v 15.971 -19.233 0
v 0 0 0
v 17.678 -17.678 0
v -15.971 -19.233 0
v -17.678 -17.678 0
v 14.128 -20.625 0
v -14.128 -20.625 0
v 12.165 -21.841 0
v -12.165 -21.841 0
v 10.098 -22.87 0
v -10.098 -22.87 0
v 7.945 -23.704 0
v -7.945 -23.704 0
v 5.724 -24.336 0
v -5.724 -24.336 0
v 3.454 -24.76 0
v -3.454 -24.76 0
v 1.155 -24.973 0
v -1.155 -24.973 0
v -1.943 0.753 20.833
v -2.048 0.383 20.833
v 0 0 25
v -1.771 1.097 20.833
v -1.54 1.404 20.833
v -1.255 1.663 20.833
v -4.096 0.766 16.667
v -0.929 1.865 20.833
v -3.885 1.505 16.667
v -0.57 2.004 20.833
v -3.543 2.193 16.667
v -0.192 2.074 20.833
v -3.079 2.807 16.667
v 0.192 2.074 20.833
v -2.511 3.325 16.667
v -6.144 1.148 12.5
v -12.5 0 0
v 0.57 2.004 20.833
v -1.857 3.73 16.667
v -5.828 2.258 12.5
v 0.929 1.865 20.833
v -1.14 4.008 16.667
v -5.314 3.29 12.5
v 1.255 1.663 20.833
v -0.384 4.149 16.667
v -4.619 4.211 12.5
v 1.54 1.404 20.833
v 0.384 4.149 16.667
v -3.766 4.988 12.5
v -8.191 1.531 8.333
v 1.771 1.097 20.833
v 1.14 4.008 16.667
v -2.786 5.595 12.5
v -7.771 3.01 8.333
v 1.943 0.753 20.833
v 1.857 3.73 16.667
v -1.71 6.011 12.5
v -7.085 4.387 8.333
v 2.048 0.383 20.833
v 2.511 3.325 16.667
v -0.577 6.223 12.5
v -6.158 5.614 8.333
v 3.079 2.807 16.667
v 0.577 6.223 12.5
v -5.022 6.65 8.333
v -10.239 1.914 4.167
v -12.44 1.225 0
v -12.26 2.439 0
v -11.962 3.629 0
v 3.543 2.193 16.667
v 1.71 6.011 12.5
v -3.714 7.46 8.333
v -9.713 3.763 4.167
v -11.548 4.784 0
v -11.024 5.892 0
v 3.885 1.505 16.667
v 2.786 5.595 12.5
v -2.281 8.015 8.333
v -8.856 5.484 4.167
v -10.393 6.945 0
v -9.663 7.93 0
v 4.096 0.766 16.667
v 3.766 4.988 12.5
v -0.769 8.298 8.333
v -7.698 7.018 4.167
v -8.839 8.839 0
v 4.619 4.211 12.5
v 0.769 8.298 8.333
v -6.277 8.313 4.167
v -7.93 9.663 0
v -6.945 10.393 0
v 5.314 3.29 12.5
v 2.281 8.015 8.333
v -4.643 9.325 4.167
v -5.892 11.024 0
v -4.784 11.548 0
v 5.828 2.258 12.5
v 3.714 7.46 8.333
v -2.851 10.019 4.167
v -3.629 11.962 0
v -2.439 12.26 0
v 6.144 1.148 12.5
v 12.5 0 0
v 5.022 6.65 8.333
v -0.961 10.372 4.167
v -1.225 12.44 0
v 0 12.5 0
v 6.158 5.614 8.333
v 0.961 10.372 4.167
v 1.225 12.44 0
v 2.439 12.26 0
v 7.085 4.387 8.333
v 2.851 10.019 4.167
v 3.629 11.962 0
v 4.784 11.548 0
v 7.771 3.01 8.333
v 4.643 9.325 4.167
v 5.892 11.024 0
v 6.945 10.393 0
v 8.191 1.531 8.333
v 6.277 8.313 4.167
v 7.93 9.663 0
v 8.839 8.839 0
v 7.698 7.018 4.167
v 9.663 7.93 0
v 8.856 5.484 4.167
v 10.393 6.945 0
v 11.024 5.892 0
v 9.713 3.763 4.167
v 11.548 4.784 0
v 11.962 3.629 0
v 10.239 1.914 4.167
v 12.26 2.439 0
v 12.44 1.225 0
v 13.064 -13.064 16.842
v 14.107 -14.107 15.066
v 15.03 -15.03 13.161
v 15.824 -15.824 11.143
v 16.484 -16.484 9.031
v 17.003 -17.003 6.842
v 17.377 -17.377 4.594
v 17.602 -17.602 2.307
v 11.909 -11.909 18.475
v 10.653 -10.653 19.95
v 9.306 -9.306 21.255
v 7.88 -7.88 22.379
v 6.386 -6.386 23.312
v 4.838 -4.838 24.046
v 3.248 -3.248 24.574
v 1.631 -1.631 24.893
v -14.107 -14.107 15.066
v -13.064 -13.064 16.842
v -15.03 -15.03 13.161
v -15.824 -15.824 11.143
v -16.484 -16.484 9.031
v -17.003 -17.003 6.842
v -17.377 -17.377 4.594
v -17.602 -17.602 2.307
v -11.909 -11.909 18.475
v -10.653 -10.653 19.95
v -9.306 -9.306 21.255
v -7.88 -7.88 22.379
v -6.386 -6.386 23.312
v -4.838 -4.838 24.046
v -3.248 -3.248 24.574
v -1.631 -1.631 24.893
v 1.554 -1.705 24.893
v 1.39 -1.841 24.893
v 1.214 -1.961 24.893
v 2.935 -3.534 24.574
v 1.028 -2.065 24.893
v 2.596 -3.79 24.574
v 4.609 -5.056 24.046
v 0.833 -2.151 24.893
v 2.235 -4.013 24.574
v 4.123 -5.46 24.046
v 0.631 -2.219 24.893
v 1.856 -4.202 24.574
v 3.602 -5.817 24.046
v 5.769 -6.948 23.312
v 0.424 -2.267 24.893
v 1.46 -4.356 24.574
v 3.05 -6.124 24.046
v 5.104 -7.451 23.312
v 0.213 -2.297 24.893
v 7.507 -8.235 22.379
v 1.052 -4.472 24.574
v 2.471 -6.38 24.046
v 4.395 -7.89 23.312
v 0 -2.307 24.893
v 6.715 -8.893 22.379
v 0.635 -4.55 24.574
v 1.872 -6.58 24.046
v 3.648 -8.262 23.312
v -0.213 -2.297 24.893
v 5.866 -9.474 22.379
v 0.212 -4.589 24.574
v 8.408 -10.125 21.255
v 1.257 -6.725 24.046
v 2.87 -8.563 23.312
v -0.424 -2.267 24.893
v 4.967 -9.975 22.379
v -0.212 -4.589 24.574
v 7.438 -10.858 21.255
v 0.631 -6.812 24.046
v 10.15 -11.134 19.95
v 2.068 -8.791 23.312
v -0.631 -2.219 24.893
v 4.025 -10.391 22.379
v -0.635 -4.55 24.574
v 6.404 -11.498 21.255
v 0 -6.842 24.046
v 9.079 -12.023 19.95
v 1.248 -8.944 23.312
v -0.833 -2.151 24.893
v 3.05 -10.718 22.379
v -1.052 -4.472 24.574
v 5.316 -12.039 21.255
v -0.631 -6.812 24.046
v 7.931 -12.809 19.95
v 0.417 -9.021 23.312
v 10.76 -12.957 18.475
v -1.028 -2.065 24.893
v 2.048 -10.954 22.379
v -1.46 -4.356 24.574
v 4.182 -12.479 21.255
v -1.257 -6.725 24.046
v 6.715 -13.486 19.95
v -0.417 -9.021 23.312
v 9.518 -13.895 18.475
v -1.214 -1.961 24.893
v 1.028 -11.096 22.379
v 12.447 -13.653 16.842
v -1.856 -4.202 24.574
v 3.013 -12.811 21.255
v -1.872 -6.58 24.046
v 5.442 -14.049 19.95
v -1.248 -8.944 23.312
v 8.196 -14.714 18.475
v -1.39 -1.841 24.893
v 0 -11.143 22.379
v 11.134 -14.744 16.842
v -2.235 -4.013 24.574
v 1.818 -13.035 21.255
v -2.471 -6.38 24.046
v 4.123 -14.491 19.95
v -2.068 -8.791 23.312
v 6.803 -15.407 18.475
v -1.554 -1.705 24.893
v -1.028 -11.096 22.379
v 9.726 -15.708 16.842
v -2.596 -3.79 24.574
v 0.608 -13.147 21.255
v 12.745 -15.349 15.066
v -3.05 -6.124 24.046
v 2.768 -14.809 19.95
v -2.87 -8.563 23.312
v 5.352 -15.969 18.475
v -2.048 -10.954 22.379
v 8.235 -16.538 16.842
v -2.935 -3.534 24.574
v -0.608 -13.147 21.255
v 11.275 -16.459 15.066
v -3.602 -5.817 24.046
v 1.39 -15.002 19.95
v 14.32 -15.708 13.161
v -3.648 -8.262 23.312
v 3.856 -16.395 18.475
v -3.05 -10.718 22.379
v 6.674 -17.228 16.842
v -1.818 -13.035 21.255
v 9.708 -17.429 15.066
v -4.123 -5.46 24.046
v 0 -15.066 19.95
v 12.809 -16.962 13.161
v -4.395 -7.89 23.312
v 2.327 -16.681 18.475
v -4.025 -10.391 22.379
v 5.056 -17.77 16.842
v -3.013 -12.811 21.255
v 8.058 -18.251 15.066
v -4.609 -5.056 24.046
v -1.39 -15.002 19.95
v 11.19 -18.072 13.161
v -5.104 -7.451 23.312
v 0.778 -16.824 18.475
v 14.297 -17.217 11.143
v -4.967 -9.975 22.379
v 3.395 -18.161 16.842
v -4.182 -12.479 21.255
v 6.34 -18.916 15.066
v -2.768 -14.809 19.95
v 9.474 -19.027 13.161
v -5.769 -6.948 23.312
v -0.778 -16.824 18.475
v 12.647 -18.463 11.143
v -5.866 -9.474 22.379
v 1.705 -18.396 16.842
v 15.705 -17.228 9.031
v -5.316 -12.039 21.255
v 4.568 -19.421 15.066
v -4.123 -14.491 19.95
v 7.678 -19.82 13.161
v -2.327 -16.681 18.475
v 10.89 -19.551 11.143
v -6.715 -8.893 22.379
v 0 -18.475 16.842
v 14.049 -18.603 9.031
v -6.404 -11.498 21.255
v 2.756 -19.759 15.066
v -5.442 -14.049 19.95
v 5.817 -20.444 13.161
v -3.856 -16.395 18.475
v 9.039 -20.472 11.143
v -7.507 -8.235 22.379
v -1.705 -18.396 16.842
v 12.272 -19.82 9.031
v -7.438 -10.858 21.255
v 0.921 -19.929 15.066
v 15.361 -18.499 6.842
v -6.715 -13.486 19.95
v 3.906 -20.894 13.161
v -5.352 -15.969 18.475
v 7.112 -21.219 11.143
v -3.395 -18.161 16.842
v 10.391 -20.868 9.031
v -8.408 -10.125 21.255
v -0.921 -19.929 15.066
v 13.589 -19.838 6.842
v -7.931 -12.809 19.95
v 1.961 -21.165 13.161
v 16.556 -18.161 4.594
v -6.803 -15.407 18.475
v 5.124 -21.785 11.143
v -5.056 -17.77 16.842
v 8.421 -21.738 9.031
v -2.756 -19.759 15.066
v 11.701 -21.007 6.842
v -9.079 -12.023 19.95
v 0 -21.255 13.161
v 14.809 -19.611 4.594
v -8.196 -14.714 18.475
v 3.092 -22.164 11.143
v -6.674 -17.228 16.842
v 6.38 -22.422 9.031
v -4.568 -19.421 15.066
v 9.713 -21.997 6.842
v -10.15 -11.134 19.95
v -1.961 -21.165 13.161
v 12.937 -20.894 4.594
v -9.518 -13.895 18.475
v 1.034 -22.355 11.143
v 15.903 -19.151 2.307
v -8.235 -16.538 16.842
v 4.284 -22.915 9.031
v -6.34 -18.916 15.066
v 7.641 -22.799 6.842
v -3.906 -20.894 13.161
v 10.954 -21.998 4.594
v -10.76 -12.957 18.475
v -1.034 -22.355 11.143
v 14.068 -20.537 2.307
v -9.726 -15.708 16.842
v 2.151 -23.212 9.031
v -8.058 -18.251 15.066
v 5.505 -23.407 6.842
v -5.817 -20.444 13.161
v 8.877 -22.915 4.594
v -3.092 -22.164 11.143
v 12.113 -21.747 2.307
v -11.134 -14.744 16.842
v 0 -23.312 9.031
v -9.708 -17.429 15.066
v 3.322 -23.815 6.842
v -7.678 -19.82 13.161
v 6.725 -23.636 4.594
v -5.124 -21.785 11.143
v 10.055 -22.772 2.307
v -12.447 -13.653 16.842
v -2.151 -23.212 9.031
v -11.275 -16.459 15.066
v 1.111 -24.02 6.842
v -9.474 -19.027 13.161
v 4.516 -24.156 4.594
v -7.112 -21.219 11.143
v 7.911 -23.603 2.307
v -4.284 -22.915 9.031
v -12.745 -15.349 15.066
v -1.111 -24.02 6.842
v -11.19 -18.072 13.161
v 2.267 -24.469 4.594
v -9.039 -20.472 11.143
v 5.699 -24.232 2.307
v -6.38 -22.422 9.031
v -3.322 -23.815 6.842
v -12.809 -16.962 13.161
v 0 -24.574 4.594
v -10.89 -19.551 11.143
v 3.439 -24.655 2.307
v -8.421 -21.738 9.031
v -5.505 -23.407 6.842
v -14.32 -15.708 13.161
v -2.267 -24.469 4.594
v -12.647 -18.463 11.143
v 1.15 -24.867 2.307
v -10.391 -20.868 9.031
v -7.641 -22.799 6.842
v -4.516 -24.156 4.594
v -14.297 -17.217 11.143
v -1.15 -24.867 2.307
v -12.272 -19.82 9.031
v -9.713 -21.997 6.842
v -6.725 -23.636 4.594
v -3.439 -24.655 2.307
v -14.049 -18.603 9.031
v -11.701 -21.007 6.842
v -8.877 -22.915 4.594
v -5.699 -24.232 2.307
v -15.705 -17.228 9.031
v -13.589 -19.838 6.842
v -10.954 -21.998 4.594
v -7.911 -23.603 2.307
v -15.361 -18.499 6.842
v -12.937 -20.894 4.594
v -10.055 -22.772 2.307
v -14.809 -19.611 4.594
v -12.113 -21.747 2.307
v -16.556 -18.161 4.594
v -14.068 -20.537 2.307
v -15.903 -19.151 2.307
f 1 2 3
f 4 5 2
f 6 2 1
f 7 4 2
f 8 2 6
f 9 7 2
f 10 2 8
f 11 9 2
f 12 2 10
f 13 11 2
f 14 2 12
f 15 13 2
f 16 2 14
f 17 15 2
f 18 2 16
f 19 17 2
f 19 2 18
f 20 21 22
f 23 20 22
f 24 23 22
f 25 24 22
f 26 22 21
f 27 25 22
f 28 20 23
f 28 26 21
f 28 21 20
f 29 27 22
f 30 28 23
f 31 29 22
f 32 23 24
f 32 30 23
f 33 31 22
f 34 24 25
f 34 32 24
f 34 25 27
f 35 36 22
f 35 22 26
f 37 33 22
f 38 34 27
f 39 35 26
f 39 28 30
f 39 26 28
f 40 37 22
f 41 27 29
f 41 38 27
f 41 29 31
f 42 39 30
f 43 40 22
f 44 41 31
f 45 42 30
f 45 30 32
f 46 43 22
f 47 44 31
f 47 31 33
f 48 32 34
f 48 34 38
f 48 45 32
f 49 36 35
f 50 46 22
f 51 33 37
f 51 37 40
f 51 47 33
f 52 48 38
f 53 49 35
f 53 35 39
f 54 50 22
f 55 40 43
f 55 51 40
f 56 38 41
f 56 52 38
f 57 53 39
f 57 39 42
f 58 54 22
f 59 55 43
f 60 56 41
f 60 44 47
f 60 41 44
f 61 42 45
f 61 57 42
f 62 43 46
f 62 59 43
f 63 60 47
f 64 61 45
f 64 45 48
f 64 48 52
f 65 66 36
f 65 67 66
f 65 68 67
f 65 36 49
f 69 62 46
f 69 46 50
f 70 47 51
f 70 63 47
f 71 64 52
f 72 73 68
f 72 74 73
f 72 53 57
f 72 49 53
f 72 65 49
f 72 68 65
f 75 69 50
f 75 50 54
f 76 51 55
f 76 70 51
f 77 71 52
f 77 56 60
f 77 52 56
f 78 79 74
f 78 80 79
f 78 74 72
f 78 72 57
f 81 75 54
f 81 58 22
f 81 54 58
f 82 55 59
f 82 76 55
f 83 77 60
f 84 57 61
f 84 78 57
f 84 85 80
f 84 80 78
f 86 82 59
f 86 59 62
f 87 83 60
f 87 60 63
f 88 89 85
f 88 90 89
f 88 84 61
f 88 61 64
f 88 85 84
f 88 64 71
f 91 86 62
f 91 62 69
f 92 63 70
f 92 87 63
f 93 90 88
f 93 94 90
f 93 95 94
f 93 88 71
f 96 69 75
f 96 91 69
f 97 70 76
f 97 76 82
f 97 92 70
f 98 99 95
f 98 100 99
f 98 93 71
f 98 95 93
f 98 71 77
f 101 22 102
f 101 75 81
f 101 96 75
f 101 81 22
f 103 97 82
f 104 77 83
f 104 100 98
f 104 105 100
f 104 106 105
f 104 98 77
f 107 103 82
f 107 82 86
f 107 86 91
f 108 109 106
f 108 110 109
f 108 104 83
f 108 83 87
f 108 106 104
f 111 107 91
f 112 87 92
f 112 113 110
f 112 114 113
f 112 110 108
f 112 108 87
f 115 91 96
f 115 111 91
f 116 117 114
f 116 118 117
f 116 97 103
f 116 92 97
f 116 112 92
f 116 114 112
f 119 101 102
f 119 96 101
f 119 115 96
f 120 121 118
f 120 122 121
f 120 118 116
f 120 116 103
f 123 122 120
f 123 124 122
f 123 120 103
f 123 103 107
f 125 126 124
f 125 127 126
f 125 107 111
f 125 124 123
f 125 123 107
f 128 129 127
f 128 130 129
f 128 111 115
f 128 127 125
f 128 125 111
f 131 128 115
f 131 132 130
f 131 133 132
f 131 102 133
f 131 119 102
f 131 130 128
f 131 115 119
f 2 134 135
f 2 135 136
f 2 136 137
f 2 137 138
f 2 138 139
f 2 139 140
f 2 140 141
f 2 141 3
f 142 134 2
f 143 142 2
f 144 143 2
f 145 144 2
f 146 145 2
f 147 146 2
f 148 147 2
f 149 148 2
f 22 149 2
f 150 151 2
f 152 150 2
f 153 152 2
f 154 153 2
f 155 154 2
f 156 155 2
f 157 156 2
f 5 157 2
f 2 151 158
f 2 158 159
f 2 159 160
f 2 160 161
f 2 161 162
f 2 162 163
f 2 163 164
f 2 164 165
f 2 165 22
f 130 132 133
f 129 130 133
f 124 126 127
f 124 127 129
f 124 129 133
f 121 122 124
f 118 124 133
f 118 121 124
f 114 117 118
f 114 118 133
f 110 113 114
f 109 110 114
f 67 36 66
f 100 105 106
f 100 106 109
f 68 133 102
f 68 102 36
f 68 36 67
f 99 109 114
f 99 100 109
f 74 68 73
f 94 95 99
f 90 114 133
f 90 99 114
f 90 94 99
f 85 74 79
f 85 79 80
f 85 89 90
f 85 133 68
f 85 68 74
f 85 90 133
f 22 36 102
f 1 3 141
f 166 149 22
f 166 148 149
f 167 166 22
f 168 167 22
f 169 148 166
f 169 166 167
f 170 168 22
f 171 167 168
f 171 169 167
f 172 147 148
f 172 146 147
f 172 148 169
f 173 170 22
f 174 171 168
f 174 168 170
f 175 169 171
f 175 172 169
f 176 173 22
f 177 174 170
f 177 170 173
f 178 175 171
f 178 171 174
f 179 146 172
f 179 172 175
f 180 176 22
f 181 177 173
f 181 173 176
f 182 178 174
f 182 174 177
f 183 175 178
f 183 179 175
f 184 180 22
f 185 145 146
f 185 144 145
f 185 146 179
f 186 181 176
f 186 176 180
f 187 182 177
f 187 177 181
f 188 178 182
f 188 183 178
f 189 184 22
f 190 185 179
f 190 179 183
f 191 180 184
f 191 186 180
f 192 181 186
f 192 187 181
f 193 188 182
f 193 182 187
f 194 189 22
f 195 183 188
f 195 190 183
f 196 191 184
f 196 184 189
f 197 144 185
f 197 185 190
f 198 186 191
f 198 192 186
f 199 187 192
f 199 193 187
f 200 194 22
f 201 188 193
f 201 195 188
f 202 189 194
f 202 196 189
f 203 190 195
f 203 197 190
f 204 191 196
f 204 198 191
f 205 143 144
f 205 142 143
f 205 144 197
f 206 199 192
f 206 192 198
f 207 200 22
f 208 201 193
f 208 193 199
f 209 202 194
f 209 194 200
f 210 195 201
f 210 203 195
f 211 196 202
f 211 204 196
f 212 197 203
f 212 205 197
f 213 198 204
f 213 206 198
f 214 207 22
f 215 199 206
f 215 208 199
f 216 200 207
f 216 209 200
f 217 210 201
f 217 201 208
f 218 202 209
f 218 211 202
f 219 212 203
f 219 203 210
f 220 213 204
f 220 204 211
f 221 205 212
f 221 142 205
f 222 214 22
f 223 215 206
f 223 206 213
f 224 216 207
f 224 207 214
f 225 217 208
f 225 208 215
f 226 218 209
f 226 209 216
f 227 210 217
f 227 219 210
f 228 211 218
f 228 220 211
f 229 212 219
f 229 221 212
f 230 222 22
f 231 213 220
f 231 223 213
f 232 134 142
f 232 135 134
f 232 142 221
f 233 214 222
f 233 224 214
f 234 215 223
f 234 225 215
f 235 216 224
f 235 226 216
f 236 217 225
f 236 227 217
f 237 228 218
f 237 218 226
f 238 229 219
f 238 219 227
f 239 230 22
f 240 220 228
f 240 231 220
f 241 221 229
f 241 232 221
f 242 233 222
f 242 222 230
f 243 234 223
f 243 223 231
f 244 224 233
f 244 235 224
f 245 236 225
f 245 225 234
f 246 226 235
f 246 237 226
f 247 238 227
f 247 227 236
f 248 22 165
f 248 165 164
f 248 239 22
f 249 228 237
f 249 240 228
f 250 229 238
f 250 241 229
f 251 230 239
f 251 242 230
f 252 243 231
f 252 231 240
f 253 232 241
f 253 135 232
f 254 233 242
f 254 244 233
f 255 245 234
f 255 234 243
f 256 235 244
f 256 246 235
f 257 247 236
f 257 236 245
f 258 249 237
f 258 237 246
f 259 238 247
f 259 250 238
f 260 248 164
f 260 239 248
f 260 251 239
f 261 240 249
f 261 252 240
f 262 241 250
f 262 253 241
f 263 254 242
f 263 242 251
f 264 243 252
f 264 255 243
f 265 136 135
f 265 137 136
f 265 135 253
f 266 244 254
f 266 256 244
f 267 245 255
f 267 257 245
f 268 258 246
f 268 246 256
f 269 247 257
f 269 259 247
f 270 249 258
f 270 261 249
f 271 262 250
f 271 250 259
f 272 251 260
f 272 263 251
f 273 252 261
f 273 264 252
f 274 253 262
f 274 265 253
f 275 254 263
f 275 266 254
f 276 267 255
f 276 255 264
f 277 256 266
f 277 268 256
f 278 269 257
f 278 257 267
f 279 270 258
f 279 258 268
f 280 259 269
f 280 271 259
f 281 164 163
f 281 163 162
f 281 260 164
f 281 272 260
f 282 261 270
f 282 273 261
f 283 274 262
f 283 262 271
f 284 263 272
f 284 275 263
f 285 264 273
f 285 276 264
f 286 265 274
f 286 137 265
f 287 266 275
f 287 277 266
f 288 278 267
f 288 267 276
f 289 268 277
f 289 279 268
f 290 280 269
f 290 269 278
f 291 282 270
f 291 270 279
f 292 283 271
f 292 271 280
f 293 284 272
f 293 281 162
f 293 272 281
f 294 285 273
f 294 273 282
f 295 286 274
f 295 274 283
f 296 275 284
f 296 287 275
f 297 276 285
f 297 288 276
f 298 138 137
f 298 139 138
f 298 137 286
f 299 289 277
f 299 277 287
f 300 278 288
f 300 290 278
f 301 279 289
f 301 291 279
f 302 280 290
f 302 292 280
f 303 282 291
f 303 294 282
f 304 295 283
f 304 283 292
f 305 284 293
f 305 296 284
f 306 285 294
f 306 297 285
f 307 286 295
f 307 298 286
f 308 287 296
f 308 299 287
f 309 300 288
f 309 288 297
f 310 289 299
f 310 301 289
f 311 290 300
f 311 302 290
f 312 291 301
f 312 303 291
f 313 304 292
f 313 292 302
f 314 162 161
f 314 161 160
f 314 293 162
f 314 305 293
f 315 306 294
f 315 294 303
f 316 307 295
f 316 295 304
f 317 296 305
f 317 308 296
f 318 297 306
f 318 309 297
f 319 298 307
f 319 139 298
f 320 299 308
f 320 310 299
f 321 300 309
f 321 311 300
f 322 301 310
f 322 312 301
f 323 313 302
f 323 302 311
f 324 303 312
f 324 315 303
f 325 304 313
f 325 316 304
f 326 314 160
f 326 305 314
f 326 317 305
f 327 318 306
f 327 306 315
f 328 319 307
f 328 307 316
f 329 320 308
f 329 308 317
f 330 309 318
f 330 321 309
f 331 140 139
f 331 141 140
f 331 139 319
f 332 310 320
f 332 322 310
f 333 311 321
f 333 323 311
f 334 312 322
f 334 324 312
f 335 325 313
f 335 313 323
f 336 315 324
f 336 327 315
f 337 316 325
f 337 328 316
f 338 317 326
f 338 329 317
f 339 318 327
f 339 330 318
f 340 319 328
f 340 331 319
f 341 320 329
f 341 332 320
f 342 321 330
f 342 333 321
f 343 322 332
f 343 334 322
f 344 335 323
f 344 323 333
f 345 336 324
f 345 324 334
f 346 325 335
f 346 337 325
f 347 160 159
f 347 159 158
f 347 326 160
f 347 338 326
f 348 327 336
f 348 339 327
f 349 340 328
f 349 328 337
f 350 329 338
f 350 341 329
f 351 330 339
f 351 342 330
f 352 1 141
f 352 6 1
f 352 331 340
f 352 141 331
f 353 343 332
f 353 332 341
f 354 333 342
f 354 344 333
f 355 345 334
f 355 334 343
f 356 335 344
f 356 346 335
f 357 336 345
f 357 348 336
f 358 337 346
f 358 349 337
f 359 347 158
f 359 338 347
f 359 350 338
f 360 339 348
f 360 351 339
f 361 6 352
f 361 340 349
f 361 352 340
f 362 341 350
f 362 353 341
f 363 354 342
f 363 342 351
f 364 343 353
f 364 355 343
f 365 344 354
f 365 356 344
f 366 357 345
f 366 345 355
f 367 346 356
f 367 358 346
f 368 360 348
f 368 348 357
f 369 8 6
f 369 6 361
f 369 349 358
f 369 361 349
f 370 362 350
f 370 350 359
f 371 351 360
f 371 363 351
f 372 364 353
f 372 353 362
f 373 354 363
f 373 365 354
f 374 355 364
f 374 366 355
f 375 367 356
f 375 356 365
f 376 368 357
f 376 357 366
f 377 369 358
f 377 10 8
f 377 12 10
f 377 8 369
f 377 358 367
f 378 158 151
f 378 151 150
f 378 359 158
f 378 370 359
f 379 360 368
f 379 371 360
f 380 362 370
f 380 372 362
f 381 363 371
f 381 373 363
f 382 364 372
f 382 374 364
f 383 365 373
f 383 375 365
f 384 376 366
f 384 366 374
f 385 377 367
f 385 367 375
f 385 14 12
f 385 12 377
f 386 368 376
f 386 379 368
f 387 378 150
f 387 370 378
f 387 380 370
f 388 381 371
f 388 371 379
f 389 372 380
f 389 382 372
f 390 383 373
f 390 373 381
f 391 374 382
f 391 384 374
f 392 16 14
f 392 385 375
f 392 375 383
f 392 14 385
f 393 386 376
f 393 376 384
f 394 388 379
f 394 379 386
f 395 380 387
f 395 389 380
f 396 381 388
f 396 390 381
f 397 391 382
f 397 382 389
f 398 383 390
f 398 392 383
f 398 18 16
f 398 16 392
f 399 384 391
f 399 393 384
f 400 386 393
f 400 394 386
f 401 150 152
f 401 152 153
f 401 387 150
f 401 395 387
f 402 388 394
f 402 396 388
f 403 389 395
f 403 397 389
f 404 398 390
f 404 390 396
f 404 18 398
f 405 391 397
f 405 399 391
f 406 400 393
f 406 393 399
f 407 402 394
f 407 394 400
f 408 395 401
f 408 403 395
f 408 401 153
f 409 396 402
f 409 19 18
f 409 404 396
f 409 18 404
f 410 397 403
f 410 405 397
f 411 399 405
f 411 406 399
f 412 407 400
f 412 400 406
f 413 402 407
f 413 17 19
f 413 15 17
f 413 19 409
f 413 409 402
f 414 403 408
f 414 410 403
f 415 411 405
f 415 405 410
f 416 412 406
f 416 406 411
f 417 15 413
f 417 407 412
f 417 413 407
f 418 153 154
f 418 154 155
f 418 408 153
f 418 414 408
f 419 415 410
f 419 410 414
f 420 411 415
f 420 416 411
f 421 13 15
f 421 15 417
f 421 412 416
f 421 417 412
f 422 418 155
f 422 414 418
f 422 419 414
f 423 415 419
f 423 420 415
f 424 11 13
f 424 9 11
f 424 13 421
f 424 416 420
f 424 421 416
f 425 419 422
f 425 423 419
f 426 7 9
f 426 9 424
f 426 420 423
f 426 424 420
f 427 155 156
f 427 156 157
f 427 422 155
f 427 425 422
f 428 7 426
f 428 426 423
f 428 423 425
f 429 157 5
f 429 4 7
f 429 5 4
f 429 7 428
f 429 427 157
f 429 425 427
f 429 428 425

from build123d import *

# Parameters (mm, degrees)
F1_ANGLE      = 180
F3_ANGLE_BACK = 45
F3_ANGLE      = 90


with BuildPart() as f1:
    # F0 (on Front) → F1 (revolve)
    with BuildSketch(Plane.XZ):
        Polygon((-12.5, 0), (0, 0), (0, 25), align=None)
    revolve(axis=Axis((0, 0, 12.5), (0, 0, -1)), revolution_arc=F1_ANGLE)


with BuildPart() as f3:
    # F2 (on Right) → F3 (revolve)
    with BuildSketch(Plane.YZ, mode=Mode.PRIVATE) as f3_sk:
        with BuildLine():
            Line((0, 0), (0, 25))
            ThreePointArc((0, 25), (-17.6776695297, 17.6776695297), (-25, 0))
            Line((-25, 0), (0, 0))
        make_face()
    revolve(f3_sk.sketch.rotate(Axis((0, 0, 12.5), (0, 0, -1)), -F3_ANGLE_BACK), axis=Axis((0, 0, 12.5), (0, 0, -1)), revolution_arc=F3_ANGLE)


solid = Compound([f1.part, f3.part])
